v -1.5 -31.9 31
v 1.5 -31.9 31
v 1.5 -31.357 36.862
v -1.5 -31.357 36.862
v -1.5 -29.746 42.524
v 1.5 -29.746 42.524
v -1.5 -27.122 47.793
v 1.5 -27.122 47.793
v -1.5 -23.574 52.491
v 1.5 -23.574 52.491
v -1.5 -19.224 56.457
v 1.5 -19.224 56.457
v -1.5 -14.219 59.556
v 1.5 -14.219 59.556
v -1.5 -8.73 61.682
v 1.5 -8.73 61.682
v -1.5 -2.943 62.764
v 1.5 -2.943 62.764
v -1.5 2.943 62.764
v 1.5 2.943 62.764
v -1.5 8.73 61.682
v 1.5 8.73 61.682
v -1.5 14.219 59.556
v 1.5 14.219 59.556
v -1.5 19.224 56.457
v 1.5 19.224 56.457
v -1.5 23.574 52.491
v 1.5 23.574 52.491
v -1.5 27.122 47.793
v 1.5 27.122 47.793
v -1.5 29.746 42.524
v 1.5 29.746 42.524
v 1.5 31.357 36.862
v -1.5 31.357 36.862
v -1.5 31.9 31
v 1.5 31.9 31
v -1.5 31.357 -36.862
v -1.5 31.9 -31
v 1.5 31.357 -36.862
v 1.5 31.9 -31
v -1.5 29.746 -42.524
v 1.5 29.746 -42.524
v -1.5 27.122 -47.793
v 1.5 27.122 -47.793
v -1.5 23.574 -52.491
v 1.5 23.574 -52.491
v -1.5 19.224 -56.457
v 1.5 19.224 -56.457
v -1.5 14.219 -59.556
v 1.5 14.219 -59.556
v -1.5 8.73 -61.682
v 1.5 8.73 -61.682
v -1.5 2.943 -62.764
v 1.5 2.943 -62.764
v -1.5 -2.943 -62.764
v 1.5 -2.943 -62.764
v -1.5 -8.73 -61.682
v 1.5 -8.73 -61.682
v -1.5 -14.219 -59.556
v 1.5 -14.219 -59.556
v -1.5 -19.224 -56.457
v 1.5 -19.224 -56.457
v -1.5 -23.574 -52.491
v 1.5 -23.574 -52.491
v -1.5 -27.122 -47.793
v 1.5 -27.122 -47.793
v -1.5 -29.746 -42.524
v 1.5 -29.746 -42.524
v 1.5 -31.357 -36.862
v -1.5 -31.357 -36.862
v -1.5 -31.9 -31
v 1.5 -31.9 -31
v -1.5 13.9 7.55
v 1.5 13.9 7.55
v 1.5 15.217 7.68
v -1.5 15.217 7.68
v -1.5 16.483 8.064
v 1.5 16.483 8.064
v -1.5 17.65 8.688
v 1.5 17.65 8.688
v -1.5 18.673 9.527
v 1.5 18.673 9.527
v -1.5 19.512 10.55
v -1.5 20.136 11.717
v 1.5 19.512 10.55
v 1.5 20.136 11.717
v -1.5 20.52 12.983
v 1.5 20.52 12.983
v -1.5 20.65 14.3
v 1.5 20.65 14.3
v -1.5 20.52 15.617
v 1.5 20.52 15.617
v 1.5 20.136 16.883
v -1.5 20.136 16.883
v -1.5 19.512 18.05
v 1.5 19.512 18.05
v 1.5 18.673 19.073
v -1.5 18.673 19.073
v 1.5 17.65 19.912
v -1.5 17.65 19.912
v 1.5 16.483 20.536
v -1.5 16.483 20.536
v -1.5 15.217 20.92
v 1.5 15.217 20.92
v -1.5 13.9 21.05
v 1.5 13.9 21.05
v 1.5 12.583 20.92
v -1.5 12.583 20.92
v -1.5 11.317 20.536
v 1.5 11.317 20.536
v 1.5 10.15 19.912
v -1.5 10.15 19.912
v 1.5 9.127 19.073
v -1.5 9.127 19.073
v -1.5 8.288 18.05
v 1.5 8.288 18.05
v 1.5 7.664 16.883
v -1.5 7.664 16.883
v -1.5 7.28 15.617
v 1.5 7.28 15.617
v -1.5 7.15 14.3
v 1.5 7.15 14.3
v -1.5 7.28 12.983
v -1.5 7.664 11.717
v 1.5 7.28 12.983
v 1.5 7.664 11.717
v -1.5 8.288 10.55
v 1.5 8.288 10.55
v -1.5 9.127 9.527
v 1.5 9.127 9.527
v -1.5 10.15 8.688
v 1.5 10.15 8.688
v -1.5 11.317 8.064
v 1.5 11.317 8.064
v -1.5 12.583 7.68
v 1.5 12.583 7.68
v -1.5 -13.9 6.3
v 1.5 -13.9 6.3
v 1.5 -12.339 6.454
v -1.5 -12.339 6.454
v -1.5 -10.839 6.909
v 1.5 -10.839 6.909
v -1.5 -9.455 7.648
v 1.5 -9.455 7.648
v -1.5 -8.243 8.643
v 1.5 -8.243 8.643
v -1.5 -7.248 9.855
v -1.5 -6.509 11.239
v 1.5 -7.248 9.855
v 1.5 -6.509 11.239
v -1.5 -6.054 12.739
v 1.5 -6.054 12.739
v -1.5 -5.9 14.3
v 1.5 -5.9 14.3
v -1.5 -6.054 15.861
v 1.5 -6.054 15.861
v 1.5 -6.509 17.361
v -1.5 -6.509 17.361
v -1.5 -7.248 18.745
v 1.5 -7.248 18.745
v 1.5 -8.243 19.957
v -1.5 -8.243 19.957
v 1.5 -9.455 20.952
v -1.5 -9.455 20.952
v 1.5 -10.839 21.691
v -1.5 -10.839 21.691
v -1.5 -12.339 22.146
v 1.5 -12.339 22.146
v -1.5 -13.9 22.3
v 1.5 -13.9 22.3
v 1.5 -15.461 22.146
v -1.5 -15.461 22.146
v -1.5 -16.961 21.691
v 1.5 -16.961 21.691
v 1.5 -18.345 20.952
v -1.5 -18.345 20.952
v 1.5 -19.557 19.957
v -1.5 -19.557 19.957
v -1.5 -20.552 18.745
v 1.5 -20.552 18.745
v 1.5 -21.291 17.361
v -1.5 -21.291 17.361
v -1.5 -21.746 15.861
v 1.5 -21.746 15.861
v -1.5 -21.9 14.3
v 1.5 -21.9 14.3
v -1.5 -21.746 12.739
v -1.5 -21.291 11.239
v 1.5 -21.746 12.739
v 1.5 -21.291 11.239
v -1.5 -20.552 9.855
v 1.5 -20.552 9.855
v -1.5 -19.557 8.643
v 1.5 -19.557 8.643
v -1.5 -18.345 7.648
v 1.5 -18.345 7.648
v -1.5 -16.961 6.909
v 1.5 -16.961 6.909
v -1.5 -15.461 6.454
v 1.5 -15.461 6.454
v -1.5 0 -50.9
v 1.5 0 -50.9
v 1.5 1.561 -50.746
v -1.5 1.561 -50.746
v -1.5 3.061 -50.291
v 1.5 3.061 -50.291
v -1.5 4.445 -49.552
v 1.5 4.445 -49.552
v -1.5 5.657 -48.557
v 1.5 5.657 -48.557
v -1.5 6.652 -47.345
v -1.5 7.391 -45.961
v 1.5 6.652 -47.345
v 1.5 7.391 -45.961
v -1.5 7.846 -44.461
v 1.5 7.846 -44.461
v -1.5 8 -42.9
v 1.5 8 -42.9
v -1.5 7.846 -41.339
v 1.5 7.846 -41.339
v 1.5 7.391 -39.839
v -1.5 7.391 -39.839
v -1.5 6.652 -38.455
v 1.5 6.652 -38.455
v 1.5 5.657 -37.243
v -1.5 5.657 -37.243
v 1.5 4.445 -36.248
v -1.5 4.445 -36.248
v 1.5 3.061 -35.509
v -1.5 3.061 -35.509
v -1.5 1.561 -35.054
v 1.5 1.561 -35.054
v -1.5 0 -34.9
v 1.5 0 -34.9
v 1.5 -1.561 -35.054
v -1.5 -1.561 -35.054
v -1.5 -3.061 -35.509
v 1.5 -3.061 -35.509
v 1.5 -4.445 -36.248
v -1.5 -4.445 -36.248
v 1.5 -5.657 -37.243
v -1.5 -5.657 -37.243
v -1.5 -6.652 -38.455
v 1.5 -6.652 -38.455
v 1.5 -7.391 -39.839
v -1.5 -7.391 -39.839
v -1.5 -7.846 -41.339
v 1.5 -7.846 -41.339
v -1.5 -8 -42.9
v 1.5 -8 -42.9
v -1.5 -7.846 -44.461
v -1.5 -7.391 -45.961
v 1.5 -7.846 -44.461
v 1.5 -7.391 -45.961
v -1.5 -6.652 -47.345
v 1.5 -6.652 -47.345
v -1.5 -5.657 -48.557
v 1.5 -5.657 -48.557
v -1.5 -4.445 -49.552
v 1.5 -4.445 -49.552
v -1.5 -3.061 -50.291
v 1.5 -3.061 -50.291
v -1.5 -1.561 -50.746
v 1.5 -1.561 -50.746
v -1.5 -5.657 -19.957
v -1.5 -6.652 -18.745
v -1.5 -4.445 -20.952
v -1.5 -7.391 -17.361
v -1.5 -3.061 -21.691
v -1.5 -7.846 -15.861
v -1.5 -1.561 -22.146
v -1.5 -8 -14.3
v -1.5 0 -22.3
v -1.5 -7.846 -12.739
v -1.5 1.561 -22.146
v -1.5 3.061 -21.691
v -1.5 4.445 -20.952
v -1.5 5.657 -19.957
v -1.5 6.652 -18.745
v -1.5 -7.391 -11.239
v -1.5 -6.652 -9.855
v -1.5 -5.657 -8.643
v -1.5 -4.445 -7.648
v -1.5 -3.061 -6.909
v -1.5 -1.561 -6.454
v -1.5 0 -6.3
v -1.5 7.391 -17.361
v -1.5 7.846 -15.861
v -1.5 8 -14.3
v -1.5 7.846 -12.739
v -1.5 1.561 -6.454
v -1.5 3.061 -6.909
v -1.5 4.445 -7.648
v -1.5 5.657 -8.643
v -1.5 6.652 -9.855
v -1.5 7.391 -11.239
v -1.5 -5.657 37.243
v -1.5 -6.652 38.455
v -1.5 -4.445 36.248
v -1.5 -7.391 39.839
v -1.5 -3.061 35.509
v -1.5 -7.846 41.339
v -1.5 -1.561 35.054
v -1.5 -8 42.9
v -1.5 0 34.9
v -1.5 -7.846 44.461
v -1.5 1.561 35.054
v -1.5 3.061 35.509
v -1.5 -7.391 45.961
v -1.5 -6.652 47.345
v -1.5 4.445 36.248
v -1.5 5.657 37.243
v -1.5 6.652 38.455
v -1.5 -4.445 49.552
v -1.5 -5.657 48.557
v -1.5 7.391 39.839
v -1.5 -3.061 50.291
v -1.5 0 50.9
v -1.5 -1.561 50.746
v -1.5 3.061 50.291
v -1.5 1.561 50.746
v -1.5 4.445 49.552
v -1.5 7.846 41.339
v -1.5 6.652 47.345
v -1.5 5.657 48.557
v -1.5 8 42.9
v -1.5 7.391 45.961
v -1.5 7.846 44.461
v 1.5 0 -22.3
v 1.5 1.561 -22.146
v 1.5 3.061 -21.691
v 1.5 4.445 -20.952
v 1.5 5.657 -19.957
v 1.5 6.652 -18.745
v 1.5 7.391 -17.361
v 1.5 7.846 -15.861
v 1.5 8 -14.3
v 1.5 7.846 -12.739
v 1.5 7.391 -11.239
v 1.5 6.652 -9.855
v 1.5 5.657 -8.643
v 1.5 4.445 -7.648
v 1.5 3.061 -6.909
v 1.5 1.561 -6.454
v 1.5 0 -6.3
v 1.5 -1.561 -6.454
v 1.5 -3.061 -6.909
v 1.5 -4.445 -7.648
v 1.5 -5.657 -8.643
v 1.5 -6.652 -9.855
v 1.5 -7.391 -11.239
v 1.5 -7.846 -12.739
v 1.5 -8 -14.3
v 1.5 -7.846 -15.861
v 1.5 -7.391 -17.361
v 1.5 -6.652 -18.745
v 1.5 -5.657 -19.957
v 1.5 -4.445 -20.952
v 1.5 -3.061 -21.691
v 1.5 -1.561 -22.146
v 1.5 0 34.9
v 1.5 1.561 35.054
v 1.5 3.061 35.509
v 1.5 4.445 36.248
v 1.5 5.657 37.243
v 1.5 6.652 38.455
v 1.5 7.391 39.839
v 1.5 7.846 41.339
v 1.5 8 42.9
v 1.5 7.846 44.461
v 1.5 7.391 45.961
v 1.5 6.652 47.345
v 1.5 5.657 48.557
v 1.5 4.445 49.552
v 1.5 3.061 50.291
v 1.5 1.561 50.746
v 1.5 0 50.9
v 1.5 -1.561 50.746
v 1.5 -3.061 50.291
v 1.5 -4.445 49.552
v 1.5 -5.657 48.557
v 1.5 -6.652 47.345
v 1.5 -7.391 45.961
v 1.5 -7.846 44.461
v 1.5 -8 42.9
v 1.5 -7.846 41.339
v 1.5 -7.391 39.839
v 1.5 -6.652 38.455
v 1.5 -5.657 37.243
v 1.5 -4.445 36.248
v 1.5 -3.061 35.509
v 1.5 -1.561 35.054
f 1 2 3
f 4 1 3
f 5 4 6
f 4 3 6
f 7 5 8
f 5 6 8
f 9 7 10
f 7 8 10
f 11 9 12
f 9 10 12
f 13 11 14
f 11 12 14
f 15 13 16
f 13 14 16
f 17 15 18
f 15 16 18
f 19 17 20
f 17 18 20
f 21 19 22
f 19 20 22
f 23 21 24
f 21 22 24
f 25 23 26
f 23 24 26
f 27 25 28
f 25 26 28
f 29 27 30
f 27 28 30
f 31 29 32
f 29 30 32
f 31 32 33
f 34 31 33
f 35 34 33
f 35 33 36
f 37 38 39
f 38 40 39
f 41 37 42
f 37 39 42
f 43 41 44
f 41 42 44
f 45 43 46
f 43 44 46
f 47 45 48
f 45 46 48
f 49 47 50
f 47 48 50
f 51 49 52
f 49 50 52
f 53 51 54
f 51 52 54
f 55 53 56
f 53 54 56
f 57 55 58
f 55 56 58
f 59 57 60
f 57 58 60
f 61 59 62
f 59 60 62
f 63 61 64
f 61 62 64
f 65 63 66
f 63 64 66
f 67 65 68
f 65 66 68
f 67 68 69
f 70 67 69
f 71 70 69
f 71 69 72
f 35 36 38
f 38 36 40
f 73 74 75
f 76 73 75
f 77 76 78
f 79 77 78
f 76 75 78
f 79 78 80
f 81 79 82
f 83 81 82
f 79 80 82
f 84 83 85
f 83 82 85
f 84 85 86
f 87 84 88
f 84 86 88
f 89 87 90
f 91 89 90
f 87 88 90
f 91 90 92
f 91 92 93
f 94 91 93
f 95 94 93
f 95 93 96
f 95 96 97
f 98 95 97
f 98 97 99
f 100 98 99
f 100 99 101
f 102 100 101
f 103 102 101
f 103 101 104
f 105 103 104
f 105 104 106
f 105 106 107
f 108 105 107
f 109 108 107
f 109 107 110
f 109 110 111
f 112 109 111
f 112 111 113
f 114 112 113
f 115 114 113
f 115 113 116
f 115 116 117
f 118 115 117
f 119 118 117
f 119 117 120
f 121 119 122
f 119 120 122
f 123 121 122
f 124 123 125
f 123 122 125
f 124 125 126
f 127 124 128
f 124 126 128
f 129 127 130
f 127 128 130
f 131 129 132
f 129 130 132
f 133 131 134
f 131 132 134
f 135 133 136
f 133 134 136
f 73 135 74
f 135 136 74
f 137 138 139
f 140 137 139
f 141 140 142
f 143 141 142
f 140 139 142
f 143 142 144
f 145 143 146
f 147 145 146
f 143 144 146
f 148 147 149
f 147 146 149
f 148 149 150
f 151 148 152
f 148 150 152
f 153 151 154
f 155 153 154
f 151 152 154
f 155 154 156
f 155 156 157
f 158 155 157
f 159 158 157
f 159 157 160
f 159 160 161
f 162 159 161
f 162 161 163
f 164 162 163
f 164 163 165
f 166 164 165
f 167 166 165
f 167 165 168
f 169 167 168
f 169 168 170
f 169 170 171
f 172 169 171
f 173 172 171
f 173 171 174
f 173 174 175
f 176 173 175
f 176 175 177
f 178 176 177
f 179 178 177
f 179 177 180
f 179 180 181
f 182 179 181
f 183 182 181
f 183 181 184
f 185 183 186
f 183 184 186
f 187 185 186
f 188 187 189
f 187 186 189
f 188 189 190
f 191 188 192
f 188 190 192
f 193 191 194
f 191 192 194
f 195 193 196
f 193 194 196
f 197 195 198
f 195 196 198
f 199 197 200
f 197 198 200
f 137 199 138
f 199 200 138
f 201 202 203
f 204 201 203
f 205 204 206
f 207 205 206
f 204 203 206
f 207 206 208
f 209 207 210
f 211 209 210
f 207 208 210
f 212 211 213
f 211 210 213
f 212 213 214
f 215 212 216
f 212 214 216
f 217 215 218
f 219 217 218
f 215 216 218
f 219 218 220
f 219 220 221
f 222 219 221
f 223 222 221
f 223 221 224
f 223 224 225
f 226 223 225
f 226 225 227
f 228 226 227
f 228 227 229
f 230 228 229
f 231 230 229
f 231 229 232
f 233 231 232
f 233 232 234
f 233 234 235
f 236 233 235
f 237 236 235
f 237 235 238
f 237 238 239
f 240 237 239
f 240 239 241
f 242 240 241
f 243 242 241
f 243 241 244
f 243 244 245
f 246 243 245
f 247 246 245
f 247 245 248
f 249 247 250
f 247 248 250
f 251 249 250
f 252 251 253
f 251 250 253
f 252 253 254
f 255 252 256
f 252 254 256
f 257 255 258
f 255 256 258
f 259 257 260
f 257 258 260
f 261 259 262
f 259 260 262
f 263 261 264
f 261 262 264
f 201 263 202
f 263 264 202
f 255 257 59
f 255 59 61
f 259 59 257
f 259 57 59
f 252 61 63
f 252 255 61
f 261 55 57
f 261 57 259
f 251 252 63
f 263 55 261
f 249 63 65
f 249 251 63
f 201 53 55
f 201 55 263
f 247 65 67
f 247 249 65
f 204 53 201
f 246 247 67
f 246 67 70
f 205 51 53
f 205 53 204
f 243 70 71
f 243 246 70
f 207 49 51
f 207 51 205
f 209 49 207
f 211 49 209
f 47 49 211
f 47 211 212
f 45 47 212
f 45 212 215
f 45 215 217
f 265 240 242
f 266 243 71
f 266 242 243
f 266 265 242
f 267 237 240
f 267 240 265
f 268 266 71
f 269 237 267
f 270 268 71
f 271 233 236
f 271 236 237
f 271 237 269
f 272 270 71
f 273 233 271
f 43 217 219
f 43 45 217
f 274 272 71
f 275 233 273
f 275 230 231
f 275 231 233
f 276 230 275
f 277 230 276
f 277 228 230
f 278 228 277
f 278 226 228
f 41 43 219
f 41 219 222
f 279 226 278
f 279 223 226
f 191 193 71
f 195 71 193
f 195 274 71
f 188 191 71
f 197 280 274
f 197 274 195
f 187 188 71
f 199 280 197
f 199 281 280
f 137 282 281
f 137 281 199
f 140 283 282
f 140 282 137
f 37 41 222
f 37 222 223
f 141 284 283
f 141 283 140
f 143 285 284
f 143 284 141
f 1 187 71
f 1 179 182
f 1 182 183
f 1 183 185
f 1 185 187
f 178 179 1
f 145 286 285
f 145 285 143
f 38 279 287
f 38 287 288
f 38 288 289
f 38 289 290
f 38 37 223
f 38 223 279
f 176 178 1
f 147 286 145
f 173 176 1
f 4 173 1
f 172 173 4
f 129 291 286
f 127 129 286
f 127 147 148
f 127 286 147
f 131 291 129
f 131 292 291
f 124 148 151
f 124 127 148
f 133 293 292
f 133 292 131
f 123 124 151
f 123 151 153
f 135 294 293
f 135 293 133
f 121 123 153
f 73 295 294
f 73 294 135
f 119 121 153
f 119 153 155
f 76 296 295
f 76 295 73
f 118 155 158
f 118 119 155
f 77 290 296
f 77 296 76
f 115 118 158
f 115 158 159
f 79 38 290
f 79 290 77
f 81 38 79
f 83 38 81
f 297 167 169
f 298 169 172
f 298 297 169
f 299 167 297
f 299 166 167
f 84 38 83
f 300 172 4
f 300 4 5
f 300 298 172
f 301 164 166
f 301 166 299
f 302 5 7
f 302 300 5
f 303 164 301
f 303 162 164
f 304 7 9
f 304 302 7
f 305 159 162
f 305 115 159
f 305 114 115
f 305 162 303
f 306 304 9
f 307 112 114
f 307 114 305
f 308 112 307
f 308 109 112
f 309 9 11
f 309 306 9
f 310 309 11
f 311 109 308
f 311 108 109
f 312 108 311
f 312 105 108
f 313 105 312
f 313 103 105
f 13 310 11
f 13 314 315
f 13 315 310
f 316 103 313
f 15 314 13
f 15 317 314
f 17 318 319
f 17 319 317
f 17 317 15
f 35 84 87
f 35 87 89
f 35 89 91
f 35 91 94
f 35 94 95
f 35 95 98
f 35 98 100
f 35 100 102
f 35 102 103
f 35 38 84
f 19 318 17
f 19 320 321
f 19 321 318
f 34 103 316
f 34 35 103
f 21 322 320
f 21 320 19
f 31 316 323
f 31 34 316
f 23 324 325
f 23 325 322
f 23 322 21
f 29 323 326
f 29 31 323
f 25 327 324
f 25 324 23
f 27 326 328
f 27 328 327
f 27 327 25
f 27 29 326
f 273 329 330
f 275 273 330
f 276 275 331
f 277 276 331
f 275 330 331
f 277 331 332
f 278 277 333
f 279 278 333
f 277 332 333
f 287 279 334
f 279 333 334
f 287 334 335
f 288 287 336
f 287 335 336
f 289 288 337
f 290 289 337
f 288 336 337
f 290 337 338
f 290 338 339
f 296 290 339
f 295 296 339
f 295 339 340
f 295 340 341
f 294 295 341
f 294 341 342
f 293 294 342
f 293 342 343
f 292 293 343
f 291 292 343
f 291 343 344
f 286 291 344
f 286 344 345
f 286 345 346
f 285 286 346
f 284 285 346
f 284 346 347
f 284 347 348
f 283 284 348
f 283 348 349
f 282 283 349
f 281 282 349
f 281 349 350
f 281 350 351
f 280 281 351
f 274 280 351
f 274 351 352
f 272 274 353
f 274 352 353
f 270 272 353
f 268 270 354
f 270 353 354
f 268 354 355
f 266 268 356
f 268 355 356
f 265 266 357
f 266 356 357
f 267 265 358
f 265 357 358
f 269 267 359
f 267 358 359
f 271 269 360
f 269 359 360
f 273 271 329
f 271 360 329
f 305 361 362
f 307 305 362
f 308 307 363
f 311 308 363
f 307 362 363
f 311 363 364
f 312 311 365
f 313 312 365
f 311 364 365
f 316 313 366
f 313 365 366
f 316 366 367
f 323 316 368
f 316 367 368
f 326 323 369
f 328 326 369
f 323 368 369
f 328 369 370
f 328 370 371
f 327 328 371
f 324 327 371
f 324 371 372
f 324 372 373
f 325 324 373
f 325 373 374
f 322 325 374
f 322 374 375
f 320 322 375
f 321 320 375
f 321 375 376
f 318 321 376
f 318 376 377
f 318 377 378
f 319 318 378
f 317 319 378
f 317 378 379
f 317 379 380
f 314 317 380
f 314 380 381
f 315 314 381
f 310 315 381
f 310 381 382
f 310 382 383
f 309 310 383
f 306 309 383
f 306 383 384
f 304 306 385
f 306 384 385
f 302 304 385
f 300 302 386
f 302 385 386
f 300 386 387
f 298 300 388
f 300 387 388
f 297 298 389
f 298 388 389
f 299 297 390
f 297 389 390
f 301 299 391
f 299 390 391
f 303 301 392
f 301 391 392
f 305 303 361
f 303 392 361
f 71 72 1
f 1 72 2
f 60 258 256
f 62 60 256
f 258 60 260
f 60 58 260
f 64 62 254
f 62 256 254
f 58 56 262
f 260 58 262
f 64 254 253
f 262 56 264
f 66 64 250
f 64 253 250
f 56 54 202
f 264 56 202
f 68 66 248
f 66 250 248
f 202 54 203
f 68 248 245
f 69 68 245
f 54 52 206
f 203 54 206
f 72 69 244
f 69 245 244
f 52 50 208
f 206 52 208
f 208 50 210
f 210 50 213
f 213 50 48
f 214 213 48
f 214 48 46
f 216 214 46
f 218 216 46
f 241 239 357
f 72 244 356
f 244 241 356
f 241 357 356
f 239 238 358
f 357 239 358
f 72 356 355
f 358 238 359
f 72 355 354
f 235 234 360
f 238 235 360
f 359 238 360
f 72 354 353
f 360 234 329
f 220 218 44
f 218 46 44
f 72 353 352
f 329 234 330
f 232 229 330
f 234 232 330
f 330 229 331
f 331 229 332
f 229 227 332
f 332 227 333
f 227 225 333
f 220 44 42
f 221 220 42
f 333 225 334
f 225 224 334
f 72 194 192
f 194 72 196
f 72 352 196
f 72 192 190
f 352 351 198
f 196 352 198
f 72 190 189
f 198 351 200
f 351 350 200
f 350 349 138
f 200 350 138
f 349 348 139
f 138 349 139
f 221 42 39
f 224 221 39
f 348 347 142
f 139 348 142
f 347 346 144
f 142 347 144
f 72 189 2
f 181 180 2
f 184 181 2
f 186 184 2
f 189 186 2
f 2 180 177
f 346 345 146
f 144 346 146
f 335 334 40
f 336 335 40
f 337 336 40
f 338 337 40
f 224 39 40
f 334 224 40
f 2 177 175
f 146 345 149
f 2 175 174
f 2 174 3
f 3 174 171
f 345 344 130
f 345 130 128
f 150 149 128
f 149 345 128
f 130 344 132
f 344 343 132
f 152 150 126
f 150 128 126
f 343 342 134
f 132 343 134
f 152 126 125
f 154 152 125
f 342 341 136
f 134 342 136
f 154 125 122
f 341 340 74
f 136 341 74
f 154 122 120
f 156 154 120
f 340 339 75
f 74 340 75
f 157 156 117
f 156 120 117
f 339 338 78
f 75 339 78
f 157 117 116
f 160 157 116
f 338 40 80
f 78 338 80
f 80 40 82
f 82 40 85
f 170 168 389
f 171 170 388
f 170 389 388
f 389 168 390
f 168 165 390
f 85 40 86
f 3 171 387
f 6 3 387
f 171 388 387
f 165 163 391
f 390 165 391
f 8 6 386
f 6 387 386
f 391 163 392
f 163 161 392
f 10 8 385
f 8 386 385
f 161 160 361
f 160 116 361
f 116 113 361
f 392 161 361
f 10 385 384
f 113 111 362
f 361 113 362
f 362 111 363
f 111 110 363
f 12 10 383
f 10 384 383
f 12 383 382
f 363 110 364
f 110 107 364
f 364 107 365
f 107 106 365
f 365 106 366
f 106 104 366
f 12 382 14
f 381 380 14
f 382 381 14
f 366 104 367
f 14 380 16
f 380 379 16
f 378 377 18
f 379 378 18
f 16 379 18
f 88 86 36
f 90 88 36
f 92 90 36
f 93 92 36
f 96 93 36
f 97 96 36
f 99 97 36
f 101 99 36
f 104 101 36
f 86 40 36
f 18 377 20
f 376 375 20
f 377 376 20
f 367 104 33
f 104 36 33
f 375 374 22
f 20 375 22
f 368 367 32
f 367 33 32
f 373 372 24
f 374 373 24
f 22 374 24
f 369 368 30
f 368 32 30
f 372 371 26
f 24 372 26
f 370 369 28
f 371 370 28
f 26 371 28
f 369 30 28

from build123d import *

# Parameters (mm, degrees)
BOSS_EXTRUDE1_DEPTH = 1.5
SKETCH2_R           = 8
SKETCH2_R_2         = 6.75
CUT_EXTRUDE1_DEPTH  = 71.590509277


with BuildPart() as part:
    # Sketch1 → Boss-Extrude1 (new, symmetric)
    with BuildSketch(Plane(origin=(0, 0, 0), x_dir=(0, 0, -1), z_dir=(1, 0, 0))):
        with BuildLine():
            Line((-31, 31.9), (31, 31.9))
            ThreePointArc((31, 31.9), (62.9, 0), (31, -31.9))
            Line((31, -31.9), (-31, -31.9))
            ThreePointArc((-31, -31.9), (-62.9, 0), (-31, 31.9))
        make_face()
    extrude(amount=BOSS_EXTRUDE1_DEPTH, both=True)

    # Sketch2 → Cut-Extrude1 (cut, through all)
    with BuildSketch(Plane(origin=(1.5, 0, 0), x_dir=(0, 0, -1), z_dir=(1, 0, 0))):
        with Locations((-42.9, 0)):
            Circle(SKETCH2_R)
        with Locations((42.9, 0)):
            Circle(SKETCH2_R)
        with Locations((-14.3, 13.9)):
            Circle(SKETCH2_R_2)
        with Locations((14.3, 0)):
            Circle(SKETCH2_R)
        with Locations((-14.3, -13.9)):
            Circle(SKETCH2_R)
    extrude(amount=-CUT_EXTRUDE1_DEPTH, mode=Mode.SUBTRACT)


solid = part.part
